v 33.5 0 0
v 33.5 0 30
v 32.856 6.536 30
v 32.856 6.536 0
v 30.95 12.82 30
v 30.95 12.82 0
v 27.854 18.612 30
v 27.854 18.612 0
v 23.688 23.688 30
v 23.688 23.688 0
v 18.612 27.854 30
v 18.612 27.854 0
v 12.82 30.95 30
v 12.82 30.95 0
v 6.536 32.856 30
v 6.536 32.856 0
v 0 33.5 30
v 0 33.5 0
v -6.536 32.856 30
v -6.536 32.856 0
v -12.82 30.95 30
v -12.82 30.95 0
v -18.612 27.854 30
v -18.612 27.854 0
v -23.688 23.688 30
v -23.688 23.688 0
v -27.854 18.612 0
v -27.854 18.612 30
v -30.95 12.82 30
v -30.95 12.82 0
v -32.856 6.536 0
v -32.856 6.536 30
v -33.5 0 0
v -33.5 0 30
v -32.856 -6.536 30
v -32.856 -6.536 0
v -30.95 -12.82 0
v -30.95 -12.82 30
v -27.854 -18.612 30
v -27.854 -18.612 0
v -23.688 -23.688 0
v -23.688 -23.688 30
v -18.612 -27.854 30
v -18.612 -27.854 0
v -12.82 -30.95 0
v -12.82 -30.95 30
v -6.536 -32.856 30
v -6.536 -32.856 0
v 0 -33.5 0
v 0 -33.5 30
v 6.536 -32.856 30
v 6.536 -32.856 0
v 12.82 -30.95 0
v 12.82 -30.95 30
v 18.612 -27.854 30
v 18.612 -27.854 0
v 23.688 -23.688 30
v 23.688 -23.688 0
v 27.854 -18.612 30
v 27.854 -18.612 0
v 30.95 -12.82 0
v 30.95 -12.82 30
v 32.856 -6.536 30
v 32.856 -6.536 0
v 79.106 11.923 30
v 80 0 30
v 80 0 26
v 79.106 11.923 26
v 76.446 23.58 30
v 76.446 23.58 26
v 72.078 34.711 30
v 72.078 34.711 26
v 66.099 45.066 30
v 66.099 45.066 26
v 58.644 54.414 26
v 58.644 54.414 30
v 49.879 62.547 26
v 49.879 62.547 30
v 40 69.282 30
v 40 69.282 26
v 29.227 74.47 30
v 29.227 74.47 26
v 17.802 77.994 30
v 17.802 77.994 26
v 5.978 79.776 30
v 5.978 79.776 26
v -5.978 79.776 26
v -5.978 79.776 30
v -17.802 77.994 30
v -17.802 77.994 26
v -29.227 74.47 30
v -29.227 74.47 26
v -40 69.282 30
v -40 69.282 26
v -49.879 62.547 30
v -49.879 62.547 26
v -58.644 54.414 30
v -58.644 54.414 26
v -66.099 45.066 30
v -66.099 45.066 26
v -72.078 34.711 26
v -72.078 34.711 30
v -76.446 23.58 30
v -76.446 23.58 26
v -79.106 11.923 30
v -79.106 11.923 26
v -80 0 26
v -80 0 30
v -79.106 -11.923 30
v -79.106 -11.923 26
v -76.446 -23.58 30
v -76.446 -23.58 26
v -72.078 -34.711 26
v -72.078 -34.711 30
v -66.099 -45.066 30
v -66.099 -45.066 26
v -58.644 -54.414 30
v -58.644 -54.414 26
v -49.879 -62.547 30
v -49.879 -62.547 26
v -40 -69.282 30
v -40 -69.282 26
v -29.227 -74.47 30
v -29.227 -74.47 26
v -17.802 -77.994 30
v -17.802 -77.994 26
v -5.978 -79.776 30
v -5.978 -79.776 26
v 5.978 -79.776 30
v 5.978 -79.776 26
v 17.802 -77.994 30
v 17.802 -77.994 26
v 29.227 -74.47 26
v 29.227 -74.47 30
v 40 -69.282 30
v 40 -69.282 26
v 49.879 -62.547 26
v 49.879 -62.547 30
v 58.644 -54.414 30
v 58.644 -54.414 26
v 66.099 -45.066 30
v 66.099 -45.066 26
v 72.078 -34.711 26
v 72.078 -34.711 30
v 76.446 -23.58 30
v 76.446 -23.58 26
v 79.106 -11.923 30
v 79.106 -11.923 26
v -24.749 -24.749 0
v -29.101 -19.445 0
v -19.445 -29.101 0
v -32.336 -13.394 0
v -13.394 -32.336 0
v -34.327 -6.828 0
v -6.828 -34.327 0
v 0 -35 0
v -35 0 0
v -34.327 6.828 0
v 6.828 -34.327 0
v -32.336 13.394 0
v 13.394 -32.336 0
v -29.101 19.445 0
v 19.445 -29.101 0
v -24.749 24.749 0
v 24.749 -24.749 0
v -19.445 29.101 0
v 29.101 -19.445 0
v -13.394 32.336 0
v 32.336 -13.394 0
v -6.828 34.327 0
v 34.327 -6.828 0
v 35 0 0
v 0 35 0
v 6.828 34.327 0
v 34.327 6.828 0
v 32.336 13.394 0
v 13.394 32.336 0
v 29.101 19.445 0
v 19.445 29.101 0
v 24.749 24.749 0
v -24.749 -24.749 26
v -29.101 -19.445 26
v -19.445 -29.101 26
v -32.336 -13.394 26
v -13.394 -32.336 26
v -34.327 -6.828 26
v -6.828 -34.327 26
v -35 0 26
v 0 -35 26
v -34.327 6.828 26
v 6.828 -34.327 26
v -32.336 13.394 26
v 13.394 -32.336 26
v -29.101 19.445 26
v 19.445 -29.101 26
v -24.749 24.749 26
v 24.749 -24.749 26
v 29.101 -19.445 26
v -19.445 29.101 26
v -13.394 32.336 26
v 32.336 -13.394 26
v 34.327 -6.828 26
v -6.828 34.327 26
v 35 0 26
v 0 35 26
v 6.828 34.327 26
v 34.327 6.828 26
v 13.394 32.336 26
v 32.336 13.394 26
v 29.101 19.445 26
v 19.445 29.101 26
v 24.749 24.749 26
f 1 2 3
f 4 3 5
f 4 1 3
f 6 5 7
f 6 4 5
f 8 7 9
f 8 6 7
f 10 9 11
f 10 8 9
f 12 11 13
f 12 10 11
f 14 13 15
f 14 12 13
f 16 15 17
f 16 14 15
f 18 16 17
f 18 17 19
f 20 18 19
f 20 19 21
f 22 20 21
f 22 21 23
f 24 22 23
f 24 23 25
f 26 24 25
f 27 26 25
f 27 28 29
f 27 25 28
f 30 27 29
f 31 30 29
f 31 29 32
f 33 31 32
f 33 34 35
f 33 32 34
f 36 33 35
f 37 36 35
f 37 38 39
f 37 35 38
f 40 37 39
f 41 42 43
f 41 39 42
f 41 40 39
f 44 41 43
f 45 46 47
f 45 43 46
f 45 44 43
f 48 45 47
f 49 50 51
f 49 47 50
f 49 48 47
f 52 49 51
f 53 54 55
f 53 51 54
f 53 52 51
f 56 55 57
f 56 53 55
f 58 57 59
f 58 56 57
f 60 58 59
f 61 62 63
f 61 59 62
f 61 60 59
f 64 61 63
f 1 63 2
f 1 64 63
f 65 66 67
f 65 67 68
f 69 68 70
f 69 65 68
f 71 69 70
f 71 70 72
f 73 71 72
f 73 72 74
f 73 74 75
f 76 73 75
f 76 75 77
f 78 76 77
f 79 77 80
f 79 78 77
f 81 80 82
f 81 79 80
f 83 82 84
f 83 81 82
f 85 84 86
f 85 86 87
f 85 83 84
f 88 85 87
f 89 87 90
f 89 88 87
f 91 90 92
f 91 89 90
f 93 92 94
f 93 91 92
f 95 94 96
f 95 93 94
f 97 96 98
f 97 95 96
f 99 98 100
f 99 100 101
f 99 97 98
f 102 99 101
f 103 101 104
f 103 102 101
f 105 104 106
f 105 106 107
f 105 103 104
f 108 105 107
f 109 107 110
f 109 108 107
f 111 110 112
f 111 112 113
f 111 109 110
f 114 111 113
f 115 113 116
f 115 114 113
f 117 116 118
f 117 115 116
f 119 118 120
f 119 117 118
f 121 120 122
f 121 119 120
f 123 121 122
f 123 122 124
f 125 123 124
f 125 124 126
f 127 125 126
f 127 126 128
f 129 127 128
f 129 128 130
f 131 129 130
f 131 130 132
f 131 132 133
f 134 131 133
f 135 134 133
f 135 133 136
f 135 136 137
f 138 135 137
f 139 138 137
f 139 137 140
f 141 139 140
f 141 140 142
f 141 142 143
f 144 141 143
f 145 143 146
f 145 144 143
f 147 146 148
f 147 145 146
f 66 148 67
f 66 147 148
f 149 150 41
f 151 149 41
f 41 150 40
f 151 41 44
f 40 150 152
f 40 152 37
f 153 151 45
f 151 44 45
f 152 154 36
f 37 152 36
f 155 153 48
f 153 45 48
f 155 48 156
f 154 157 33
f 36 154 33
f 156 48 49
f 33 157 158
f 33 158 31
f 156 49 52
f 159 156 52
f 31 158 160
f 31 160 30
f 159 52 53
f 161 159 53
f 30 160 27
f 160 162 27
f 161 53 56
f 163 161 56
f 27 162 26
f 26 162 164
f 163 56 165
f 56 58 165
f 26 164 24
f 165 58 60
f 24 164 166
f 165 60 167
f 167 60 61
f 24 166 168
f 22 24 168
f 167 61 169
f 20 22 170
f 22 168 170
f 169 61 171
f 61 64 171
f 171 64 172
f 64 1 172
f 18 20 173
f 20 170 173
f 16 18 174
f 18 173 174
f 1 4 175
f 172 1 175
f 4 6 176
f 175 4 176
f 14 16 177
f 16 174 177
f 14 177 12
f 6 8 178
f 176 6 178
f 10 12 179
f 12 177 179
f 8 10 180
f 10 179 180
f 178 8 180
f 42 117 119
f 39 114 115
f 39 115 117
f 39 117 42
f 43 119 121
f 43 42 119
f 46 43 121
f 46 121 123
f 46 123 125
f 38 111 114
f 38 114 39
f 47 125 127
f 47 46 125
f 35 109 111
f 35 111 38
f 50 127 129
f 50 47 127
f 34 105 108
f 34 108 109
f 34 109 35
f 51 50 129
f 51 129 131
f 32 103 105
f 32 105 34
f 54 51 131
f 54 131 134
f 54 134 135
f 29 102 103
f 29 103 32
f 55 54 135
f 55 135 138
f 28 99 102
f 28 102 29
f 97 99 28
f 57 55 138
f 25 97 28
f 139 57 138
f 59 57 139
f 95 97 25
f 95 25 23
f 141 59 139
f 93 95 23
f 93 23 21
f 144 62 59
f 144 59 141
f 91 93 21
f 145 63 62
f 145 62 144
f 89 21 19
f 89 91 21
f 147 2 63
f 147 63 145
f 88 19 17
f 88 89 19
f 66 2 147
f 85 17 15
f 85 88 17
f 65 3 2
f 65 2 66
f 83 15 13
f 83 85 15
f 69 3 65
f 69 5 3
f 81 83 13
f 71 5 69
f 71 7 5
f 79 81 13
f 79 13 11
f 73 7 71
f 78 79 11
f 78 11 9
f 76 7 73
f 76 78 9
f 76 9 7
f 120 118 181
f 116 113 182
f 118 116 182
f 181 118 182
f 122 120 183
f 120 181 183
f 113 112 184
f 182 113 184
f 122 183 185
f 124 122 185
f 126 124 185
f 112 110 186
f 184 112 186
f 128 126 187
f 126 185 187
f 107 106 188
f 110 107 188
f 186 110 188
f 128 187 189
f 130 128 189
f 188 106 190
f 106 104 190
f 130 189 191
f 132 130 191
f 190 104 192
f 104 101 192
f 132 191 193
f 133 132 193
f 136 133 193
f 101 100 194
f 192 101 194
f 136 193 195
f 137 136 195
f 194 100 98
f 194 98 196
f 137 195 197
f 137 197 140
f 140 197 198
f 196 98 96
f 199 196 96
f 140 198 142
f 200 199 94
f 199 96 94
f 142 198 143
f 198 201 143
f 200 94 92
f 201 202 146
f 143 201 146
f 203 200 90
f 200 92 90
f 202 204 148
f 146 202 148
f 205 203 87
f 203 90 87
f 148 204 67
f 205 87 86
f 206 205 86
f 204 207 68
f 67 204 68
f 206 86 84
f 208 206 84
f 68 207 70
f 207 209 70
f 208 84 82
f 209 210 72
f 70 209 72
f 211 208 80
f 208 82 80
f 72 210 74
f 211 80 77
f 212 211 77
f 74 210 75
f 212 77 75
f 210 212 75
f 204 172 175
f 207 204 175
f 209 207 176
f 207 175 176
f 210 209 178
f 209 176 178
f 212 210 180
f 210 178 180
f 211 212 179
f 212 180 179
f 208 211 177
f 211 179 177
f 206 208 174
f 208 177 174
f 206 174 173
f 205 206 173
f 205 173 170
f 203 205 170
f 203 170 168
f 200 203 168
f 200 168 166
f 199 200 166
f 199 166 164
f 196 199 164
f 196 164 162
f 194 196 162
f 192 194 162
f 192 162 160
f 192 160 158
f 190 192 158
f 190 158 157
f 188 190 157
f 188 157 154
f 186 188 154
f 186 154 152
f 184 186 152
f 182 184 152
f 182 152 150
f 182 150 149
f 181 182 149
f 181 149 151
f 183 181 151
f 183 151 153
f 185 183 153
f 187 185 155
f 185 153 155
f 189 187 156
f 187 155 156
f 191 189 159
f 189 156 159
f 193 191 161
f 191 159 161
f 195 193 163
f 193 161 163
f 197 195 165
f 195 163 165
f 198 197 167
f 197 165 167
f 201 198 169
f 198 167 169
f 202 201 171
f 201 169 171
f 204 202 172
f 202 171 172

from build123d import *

# Parameters (mm, degrees)
SKETCH_R      = 35
PAD_DEPTH     = 30
SKETCH001_R   = 33.5
POCKET_DEPTH  = 30.001
SKETCH002_R   = 80
SKETCH002_R_2 = 35
PAD001_DEPTH  = 4


with BuildPart() as part:
    # Sketch → Pad (new body)
    with BuildSketch(Plane.XY):
        Circle(SKETCH_R)
    extrude(amount=PAD_DEPTH)

    # Sketch001 → Pocket (cut, through all)
    with BuildSketch(Plane.XY):
        Circle(SKETCH001_R)
    extrude(amount=POCKET_DEPTH, mode=Mode.SUBTRACT)

    # Sketch002 (on DatumPlane) → Pad001 (join)
    with BuildSketch(Plane.XY.offset(30)):
        Circle(SKETCH002_R)
        Circle(SKETCH002_R_2, mode=Mode.SUBTRACT)
    extrude(amount=-PAD001_DEPTH)


solid = part.part
